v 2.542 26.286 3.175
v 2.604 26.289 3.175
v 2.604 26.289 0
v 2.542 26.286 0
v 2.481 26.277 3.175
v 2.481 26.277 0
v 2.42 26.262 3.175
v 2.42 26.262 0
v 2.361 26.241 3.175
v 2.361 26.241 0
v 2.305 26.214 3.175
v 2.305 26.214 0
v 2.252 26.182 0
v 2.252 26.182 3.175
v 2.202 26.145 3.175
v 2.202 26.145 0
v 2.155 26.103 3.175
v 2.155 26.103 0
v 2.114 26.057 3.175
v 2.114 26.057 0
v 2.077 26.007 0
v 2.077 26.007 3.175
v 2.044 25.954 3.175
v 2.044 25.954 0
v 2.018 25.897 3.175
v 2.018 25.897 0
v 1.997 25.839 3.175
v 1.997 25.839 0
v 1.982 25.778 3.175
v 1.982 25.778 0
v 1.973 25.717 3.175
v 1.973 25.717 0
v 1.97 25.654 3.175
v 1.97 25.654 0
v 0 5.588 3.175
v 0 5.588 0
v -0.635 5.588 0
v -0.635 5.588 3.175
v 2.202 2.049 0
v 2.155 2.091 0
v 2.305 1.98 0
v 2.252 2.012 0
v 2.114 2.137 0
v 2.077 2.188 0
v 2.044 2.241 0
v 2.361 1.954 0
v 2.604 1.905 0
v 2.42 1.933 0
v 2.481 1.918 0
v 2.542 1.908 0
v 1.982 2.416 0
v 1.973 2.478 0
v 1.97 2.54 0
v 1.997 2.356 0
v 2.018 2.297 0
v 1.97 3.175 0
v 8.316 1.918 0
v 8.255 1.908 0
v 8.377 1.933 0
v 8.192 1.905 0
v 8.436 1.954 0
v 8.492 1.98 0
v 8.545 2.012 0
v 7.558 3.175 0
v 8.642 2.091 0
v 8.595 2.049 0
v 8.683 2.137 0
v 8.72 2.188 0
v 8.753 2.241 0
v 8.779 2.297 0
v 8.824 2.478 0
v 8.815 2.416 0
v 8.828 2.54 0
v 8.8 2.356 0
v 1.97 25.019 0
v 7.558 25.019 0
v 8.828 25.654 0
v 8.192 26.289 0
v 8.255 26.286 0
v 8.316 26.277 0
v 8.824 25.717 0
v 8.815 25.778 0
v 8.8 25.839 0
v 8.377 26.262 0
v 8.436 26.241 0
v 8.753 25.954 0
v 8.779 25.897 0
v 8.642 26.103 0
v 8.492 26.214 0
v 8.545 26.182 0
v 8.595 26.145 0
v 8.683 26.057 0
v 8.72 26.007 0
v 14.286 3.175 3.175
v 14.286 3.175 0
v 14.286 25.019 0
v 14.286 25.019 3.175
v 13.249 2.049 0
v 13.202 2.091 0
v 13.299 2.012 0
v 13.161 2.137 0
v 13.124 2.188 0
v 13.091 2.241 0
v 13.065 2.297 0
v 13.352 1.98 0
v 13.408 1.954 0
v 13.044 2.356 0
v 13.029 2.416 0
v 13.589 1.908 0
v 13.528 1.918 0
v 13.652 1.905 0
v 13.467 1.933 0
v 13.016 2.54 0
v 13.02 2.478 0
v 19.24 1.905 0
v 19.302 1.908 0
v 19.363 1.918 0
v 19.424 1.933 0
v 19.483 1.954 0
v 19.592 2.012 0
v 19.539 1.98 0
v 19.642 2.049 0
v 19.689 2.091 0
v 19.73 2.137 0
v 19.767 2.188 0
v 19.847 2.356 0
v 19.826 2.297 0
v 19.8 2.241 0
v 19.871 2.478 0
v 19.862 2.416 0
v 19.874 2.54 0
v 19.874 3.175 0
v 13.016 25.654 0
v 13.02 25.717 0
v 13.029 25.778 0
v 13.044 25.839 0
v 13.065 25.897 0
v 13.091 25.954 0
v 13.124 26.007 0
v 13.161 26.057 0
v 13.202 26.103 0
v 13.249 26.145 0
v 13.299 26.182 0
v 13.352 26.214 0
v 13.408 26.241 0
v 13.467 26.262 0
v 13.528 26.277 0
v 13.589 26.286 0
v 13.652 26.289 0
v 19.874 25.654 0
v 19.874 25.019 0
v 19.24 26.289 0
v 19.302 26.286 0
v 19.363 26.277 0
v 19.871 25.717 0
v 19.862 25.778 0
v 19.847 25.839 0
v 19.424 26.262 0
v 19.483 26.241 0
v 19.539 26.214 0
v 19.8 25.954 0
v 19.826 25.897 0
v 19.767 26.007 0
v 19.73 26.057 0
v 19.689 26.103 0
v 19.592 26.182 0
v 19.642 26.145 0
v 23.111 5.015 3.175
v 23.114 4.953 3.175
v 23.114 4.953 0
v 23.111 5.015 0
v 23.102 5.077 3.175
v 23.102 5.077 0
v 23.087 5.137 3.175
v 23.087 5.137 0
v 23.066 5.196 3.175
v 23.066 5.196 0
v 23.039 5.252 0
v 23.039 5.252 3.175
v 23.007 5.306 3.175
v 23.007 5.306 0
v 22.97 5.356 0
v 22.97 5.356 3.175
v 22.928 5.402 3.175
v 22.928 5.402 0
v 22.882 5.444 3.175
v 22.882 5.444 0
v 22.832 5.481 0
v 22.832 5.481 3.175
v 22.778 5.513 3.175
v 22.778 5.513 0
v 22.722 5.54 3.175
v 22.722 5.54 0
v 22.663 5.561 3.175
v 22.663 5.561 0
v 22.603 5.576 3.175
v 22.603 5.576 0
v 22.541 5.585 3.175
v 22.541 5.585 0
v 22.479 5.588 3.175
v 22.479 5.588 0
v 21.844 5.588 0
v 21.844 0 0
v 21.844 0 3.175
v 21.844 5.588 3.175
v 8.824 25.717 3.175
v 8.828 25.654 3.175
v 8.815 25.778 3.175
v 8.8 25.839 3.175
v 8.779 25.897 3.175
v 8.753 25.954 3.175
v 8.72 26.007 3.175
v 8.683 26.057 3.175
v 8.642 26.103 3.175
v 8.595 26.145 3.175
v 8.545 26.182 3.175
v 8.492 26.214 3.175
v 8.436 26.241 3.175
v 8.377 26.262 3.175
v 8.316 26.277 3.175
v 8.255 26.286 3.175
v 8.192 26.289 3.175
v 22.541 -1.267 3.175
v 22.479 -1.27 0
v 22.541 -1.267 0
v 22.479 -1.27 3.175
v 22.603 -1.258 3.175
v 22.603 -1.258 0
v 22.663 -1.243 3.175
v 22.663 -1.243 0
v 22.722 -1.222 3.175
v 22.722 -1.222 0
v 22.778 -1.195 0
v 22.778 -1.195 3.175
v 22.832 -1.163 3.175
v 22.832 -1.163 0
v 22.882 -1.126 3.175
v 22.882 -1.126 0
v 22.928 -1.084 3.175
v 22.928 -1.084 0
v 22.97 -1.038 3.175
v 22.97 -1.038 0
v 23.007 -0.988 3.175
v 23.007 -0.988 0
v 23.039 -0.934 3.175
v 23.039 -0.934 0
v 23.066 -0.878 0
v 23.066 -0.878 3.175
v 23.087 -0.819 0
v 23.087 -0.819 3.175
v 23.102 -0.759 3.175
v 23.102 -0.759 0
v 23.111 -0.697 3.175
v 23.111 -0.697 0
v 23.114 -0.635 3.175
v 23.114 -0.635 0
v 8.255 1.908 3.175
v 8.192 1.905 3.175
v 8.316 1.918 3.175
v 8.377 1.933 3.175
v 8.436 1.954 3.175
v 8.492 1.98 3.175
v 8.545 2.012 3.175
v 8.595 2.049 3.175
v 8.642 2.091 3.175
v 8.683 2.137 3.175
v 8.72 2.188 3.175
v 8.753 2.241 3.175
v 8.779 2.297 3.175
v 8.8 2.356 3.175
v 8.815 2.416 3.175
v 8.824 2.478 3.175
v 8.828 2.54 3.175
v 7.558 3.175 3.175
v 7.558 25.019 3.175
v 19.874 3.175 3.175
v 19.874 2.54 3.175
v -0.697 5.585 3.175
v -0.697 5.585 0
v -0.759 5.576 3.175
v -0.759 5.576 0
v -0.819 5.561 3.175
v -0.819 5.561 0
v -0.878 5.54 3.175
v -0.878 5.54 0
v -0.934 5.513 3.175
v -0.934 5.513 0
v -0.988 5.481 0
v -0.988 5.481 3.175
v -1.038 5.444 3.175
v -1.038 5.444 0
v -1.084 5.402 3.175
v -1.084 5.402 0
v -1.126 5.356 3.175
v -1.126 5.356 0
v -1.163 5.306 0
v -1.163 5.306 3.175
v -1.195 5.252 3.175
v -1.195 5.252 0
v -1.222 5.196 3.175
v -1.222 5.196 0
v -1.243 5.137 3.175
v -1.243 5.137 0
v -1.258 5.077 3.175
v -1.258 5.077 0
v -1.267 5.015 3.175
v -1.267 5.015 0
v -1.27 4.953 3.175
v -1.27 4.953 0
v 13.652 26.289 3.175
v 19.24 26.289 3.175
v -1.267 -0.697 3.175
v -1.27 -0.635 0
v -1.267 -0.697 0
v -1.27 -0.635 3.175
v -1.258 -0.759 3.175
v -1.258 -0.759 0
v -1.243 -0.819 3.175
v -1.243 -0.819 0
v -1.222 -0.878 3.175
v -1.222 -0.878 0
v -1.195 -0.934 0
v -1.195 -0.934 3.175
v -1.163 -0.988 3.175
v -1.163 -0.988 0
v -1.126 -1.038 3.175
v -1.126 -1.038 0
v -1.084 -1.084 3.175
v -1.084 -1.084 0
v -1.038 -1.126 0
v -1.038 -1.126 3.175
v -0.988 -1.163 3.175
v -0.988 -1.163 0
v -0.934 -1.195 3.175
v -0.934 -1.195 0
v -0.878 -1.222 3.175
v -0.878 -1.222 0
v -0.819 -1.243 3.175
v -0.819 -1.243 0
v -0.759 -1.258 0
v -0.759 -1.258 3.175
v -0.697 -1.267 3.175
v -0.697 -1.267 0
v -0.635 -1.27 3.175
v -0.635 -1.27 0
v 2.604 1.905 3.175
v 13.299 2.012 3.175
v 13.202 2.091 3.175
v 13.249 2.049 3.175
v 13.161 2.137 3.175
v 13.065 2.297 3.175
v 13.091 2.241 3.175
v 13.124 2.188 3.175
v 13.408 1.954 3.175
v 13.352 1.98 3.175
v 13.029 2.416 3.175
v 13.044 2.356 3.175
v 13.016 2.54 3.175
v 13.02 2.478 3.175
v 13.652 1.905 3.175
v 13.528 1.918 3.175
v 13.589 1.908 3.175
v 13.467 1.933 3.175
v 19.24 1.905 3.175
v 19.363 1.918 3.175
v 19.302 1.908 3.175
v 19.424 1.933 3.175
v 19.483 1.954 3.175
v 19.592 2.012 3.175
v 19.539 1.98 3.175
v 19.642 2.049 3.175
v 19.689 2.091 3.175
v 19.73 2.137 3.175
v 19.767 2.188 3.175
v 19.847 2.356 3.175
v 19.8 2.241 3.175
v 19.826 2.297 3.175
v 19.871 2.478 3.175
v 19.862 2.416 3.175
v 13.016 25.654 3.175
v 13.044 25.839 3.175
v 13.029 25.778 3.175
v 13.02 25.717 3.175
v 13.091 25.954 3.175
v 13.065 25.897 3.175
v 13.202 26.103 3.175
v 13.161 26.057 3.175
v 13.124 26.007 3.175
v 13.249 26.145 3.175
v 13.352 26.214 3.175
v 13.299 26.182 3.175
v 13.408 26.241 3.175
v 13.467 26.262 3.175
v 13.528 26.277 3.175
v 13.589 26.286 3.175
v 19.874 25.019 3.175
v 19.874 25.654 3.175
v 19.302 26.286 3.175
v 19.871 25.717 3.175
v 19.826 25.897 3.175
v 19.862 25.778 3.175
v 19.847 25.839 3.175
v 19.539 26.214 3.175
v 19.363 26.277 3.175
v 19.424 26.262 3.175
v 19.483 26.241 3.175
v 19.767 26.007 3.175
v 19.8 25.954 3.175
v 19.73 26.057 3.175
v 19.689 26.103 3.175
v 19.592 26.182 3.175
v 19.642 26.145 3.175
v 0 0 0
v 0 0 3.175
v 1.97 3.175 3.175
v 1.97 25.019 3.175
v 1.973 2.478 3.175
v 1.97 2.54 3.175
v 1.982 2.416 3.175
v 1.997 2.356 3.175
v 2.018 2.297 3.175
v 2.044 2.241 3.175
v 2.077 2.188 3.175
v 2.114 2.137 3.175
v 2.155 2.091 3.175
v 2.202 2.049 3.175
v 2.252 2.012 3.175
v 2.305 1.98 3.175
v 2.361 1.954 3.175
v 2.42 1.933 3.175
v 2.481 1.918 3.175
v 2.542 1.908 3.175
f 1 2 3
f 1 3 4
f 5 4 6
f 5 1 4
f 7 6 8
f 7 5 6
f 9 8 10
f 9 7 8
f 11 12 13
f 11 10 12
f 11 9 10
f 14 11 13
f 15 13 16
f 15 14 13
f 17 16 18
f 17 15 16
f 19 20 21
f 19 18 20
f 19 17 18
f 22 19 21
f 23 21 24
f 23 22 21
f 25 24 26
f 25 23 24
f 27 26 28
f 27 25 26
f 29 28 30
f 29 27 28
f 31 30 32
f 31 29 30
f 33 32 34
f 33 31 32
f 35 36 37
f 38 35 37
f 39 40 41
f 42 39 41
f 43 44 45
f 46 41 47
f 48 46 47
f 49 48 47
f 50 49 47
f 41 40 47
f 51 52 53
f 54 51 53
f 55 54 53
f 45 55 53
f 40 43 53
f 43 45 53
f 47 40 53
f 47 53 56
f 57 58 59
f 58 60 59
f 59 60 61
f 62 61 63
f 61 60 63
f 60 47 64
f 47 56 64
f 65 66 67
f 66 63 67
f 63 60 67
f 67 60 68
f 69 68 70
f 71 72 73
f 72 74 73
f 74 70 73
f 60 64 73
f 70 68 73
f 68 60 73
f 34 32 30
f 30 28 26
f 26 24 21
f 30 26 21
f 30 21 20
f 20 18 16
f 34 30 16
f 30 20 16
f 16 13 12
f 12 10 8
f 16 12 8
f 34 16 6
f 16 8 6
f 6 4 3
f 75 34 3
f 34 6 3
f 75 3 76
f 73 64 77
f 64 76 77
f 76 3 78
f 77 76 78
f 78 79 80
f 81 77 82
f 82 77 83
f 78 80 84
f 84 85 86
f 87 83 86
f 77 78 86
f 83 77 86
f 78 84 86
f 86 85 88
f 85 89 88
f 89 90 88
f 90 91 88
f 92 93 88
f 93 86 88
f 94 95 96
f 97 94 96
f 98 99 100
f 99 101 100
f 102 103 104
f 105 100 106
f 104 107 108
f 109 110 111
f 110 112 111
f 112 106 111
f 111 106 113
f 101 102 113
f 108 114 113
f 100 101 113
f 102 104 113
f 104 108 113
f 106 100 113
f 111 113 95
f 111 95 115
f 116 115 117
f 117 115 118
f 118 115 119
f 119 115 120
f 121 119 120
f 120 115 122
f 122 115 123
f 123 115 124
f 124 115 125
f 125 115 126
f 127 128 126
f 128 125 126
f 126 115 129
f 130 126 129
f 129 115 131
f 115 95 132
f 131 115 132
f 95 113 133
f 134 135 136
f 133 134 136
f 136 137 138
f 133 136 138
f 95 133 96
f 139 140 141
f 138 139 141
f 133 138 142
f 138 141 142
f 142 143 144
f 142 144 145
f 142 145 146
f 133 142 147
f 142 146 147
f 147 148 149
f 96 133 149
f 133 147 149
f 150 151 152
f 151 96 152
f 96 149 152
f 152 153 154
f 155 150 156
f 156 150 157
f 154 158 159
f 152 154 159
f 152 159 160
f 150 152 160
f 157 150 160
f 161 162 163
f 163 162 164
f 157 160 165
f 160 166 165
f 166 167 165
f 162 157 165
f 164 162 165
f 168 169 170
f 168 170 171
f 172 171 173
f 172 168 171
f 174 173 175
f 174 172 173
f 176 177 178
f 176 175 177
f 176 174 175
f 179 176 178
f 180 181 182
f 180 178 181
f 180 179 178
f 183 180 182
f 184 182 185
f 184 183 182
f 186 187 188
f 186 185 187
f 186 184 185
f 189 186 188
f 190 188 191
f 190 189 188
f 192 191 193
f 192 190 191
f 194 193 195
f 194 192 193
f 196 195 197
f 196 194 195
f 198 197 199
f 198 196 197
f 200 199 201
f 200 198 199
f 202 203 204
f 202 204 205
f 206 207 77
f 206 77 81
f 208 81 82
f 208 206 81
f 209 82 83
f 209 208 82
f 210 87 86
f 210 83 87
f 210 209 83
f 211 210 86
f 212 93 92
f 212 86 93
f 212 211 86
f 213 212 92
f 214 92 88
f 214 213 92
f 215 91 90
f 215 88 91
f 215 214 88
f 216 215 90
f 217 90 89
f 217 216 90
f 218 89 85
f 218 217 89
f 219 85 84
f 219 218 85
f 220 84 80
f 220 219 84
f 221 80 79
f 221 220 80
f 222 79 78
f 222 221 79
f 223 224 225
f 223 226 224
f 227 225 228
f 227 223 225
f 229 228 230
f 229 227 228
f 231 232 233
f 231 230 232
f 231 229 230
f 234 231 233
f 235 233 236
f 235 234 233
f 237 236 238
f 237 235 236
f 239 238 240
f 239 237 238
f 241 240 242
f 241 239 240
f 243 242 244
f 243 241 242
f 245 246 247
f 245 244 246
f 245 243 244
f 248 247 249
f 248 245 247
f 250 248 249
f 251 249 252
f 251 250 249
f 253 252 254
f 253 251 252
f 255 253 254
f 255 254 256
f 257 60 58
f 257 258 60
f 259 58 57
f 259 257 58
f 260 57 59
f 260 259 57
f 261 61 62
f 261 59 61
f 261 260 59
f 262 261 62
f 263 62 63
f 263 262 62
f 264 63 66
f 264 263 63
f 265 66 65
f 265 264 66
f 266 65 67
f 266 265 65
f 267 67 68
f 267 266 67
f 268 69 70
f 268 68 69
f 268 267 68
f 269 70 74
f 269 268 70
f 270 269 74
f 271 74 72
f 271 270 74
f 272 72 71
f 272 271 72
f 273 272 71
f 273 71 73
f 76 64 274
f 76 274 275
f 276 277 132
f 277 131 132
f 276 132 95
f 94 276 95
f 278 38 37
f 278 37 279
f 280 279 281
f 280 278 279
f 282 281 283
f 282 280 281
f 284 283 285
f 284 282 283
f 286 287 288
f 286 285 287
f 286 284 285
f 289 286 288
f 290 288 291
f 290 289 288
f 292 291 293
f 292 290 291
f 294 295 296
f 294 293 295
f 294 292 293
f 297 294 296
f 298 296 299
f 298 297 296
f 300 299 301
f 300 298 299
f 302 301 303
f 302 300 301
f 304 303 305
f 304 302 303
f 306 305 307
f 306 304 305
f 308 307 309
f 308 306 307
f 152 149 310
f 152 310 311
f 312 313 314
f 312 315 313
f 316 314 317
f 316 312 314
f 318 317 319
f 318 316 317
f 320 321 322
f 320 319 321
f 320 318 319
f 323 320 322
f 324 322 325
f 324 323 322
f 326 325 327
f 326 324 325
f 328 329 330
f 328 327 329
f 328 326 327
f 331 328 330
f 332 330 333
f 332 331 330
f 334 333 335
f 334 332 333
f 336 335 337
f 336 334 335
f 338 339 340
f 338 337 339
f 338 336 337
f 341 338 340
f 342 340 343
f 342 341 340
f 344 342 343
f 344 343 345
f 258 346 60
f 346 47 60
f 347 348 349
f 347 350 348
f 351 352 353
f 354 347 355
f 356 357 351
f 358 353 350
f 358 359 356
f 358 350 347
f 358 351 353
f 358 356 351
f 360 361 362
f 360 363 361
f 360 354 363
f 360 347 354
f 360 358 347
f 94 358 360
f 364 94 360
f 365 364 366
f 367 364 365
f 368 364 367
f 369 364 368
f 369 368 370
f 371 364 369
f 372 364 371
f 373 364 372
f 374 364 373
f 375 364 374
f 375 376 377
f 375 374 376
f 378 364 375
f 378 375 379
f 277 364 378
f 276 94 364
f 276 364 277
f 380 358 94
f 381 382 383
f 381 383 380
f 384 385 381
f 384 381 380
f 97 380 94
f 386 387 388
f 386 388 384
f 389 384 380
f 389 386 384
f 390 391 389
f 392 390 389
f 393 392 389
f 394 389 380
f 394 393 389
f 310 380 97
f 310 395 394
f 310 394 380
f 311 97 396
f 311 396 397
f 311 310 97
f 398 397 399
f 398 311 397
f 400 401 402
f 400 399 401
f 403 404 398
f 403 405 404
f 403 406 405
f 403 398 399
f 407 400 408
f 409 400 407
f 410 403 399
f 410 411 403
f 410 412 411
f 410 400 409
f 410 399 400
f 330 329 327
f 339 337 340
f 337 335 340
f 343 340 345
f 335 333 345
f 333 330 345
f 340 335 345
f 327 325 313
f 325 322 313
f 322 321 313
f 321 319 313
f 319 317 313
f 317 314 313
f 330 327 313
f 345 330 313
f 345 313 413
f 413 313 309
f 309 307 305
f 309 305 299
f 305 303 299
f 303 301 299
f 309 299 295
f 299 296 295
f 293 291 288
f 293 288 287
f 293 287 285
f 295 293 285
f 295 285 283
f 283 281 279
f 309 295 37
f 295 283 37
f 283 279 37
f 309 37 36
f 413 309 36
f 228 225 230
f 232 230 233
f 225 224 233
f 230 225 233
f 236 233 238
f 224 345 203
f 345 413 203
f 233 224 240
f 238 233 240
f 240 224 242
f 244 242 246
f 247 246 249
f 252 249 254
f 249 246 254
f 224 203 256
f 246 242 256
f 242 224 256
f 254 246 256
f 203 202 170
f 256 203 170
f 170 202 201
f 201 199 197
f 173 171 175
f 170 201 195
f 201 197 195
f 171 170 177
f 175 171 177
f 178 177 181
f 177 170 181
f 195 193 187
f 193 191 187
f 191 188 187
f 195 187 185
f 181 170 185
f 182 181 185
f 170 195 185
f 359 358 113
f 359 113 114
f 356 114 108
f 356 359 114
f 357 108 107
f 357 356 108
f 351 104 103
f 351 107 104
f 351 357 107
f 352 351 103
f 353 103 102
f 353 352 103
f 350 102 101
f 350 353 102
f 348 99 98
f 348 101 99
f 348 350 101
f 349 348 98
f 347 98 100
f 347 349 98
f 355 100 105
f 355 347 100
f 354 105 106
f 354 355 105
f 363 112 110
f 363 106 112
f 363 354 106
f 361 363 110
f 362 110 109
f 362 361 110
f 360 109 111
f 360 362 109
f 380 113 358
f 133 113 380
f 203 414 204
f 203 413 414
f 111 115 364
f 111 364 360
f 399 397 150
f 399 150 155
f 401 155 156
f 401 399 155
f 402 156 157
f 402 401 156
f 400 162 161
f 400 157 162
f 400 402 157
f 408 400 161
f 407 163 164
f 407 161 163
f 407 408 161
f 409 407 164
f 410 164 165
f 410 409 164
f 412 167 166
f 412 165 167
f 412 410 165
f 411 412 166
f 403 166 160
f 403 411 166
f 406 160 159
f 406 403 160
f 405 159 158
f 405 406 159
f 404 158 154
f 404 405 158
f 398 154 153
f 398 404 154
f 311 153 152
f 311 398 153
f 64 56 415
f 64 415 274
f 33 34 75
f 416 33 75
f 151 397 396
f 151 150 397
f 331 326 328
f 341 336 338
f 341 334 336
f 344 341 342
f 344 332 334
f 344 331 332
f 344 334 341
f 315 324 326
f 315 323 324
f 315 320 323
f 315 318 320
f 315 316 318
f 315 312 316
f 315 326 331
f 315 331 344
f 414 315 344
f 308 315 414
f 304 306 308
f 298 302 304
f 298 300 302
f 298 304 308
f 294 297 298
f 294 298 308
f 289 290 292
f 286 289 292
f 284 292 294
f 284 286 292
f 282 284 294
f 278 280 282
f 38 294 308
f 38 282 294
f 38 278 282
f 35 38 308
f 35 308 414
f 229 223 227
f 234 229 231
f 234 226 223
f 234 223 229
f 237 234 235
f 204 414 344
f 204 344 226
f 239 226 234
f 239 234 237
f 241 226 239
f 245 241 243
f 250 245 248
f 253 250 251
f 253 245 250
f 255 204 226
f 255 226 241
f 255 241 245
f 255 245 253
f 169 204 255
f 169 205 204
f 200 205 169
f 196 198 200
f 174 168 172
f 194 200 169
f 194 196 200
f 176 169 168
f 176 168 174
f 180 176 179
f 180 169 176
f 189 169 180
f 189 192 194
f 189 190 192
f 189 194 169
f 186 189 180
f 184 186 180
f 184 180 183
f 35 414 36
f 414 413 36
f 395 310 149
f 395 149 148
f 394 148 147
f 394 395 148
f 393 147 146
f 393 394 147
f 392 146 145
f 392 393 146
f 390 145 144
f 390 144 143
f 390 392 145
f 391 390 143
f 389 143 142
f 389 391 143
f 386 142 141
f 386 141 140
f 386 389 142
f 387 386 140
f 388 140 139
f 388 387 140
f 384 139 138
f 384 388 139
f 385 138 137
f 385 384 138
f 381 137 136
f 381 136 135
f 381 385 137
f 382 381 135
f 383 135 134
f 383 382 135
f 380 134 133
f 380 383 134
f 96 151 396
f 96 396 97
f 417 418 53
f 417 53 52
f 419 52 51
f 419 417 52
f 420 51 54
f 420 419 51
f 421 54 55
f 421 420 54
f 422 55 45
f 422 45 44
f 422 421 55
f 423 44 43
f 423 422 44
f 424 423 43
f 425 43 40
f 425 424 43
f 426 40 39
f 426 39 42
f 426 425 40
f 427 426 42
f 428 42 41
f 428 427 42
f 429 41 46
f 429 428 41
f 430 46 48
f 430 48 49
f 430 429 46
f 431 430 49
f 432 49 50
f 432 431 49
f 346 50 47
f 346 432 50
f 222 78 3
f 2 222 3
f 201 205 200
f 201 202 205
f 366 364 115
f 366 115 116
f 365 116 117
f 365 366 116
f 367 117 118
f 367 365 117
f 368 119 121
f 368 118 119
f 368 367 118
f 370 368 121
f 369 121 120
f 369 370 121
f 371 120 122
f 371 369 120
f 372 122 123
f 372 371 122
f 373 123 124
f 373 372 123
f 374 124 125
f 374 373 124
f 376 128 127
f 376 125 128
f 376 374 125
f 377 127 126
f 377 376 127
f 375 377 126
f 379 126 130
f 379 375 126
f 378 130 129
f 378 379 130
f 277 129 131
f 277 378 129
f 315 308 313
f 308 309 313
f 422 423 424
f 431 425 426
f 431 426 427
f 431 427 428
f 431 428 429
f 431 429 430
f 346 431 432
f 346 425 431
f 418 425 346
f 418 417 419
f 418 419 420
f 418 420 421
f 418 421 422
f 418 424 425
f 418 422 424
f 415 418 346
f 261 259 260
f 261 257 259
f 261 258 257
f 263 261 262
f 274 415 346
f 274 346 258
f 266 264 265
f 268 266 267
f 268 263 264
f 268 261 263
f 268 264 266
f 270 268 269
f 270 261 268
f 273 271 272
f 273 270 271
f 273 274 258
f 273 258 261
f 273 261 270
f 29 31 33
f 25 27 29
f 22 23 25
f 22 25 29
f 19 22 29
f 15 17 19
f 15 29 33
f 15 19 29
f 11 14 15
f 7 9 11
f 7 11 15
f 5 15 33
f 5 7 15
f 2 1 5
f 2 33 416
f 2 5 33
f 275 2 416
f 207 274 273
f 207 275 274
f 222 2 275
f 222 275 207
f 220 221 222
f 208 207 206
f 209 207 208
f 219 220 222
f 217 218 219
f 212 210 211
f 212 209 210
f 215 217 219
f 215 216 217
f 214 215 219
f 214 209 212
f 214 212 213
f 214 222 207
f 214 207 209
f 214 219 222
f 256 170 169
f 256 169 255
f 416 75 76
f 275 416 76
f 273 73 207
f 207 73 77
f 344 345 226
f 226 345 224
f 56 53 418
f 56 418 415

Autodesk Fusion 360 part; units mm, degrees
sketch "Sketch1" plane through (0, 0, 0) normal (0, 0, 1) x (1, 0, 0)
  line L0 (0, 0) -> (21.844, 0)
  line L1 (21.844, 0) -> (21.844, 5.588)
  line L2 (21.844, 5.588) -> (23.114, 5.588)
  line L3 (23.114, 5.588) -> (23.114, -1.27)
  line L4 (0, 0) -> (0, 5.588)
  line L5 (0, 5.588) -> (-1.27, 5.588)
  line L6 (-1.27, 5.588) -> (-1.27, -1.27)
  line L7 (-1.27, -1.27) -> (23.114, -1.27)
  line L8 (21.844, 0) -> (19.5989, 2.2451) construction
  line L9 (21.844, 0) -> (25.019, 0) construction
  line L10 (21.7167, 5.588) -> (23.114, 5.588)
  line L11 (21.7167, 0.1273) -> (21.7167, 5.588)
  line L12 (0, 5.588) -> (-1.27, 5.588)
  line L13 (21.7167, 0.1273) -> (19.5989, 2.2451) construction
  line L14 (0, 0.1273) -> (21.7167, 0.1273)
  line L15 (0, 0) -> (0, 5.588)
  line L16 (-1.27, -1.27) -> (23.114, -1.27)
  line L17 (23.114, 5.588) -> (23.114, -1.27)
  line L18 (-1.27, 5.588) -> (-1.27, -1.27)
  line L19 (0, 5.588) -> (1.5875, 5.588) construction
  line L20 (1.9695, 0.1273) -> (1.9695, 1.9053) construction
  line L21 (1.9695, 1.9053) -> (8.8275, 1.9053)
  line L22 (8.8275, 1.9053) -> (8.8275, 26.2893)
  line L23 (8.8275, 26.2893) -> (1.9695, 26.2893)
  line L24 (1.9695, 1.9053) -> (1.9695, 3.1753)
  line L25 (1.9695, 3.1753) -> (7.5575, 3.1753)
  line L26 (1.9695, 26.2893) -> (1.9695, 25.0193)
  line L27 (1.9695, 25.0193) -> (7.5575, 25.0193)
  line L28 (7.5575, 3.1753) -> (7.5575, 25.0193)
  line L29 (13.0165, 26.2893) -> (19.8745, 26.2893)
  line L30 (19.8745, 26.2893) -> (19.8745, 25.0193)
  line L31 (19.8745, 25.0193) -> (14.2865, 25.0193)
  line L32 (14.2865, 3.1753) -> (14.2865, 25.0193)
  line L33 (13.0165, 1.9053) -> (13.0165, 26.2893)
  line L34 (19.8745, 1.9053) -> (13.0165, 1.9053)
  line L35 (19.8745, 3.1753) -> (14.2865, 3.1753)
  line L36 (19.8745, 1.9053) -> (19.8745, 3.1753)
  point P0 (0, 0.1273)
  dimension "d15" = 1.5875
  dimension "d16" = 1.778
  dimension "d17" = 6.858
  dimension "d18" = 24.384
  dimension "d19" = 6.858
  dimension "d20" = 1.27
  dimension "d21" = 5.588
  dimension "d22" = 1.27
  dimension "d23" = 5.588
extrude "Extrude1" add sketch "Sketch1" along normal blind 3.175 contours L0 L1 L2 L3 L4 L5 L6 L7 L10 L12 L15 L16 L17 L18 | L21 L22 L23 L24 L25 L26 L27 L28 | L29 L30 L31 L32 L33 L34 L35 L36 makes body 1 at (14.986, -1.27, 2.1167) makes body 2 at (8.8275, 18.1613, 2.1167) makes body 3 at (13.0165, 18.1613, 2.1167)
fillet "Fillet1" radius 0.635 8 edges at (-1.27, -1.27, 1.5875) (23.114, -1.27, 1.5875) (-1.27, 5.588, 1.5875) (23.114, 5.588, 1.5875) (1.9695, 1.9053, 1.5875) (8.8275, 1.9053, 1.5875) (8.8275, 26.2893, 1.5875) (1.9695, 26.2893, 1.5875) on bodies 1 2 3
fillet "Fillet1" radius 0.635 4 edges at (19.8745, 1.9053, 1.5875) (13.0165, 1.9053, 1.5875) (13.0165, 26.2893, 1.5875) (19.8745, 26.2893, 1.5875) on bodies 1 2 3
